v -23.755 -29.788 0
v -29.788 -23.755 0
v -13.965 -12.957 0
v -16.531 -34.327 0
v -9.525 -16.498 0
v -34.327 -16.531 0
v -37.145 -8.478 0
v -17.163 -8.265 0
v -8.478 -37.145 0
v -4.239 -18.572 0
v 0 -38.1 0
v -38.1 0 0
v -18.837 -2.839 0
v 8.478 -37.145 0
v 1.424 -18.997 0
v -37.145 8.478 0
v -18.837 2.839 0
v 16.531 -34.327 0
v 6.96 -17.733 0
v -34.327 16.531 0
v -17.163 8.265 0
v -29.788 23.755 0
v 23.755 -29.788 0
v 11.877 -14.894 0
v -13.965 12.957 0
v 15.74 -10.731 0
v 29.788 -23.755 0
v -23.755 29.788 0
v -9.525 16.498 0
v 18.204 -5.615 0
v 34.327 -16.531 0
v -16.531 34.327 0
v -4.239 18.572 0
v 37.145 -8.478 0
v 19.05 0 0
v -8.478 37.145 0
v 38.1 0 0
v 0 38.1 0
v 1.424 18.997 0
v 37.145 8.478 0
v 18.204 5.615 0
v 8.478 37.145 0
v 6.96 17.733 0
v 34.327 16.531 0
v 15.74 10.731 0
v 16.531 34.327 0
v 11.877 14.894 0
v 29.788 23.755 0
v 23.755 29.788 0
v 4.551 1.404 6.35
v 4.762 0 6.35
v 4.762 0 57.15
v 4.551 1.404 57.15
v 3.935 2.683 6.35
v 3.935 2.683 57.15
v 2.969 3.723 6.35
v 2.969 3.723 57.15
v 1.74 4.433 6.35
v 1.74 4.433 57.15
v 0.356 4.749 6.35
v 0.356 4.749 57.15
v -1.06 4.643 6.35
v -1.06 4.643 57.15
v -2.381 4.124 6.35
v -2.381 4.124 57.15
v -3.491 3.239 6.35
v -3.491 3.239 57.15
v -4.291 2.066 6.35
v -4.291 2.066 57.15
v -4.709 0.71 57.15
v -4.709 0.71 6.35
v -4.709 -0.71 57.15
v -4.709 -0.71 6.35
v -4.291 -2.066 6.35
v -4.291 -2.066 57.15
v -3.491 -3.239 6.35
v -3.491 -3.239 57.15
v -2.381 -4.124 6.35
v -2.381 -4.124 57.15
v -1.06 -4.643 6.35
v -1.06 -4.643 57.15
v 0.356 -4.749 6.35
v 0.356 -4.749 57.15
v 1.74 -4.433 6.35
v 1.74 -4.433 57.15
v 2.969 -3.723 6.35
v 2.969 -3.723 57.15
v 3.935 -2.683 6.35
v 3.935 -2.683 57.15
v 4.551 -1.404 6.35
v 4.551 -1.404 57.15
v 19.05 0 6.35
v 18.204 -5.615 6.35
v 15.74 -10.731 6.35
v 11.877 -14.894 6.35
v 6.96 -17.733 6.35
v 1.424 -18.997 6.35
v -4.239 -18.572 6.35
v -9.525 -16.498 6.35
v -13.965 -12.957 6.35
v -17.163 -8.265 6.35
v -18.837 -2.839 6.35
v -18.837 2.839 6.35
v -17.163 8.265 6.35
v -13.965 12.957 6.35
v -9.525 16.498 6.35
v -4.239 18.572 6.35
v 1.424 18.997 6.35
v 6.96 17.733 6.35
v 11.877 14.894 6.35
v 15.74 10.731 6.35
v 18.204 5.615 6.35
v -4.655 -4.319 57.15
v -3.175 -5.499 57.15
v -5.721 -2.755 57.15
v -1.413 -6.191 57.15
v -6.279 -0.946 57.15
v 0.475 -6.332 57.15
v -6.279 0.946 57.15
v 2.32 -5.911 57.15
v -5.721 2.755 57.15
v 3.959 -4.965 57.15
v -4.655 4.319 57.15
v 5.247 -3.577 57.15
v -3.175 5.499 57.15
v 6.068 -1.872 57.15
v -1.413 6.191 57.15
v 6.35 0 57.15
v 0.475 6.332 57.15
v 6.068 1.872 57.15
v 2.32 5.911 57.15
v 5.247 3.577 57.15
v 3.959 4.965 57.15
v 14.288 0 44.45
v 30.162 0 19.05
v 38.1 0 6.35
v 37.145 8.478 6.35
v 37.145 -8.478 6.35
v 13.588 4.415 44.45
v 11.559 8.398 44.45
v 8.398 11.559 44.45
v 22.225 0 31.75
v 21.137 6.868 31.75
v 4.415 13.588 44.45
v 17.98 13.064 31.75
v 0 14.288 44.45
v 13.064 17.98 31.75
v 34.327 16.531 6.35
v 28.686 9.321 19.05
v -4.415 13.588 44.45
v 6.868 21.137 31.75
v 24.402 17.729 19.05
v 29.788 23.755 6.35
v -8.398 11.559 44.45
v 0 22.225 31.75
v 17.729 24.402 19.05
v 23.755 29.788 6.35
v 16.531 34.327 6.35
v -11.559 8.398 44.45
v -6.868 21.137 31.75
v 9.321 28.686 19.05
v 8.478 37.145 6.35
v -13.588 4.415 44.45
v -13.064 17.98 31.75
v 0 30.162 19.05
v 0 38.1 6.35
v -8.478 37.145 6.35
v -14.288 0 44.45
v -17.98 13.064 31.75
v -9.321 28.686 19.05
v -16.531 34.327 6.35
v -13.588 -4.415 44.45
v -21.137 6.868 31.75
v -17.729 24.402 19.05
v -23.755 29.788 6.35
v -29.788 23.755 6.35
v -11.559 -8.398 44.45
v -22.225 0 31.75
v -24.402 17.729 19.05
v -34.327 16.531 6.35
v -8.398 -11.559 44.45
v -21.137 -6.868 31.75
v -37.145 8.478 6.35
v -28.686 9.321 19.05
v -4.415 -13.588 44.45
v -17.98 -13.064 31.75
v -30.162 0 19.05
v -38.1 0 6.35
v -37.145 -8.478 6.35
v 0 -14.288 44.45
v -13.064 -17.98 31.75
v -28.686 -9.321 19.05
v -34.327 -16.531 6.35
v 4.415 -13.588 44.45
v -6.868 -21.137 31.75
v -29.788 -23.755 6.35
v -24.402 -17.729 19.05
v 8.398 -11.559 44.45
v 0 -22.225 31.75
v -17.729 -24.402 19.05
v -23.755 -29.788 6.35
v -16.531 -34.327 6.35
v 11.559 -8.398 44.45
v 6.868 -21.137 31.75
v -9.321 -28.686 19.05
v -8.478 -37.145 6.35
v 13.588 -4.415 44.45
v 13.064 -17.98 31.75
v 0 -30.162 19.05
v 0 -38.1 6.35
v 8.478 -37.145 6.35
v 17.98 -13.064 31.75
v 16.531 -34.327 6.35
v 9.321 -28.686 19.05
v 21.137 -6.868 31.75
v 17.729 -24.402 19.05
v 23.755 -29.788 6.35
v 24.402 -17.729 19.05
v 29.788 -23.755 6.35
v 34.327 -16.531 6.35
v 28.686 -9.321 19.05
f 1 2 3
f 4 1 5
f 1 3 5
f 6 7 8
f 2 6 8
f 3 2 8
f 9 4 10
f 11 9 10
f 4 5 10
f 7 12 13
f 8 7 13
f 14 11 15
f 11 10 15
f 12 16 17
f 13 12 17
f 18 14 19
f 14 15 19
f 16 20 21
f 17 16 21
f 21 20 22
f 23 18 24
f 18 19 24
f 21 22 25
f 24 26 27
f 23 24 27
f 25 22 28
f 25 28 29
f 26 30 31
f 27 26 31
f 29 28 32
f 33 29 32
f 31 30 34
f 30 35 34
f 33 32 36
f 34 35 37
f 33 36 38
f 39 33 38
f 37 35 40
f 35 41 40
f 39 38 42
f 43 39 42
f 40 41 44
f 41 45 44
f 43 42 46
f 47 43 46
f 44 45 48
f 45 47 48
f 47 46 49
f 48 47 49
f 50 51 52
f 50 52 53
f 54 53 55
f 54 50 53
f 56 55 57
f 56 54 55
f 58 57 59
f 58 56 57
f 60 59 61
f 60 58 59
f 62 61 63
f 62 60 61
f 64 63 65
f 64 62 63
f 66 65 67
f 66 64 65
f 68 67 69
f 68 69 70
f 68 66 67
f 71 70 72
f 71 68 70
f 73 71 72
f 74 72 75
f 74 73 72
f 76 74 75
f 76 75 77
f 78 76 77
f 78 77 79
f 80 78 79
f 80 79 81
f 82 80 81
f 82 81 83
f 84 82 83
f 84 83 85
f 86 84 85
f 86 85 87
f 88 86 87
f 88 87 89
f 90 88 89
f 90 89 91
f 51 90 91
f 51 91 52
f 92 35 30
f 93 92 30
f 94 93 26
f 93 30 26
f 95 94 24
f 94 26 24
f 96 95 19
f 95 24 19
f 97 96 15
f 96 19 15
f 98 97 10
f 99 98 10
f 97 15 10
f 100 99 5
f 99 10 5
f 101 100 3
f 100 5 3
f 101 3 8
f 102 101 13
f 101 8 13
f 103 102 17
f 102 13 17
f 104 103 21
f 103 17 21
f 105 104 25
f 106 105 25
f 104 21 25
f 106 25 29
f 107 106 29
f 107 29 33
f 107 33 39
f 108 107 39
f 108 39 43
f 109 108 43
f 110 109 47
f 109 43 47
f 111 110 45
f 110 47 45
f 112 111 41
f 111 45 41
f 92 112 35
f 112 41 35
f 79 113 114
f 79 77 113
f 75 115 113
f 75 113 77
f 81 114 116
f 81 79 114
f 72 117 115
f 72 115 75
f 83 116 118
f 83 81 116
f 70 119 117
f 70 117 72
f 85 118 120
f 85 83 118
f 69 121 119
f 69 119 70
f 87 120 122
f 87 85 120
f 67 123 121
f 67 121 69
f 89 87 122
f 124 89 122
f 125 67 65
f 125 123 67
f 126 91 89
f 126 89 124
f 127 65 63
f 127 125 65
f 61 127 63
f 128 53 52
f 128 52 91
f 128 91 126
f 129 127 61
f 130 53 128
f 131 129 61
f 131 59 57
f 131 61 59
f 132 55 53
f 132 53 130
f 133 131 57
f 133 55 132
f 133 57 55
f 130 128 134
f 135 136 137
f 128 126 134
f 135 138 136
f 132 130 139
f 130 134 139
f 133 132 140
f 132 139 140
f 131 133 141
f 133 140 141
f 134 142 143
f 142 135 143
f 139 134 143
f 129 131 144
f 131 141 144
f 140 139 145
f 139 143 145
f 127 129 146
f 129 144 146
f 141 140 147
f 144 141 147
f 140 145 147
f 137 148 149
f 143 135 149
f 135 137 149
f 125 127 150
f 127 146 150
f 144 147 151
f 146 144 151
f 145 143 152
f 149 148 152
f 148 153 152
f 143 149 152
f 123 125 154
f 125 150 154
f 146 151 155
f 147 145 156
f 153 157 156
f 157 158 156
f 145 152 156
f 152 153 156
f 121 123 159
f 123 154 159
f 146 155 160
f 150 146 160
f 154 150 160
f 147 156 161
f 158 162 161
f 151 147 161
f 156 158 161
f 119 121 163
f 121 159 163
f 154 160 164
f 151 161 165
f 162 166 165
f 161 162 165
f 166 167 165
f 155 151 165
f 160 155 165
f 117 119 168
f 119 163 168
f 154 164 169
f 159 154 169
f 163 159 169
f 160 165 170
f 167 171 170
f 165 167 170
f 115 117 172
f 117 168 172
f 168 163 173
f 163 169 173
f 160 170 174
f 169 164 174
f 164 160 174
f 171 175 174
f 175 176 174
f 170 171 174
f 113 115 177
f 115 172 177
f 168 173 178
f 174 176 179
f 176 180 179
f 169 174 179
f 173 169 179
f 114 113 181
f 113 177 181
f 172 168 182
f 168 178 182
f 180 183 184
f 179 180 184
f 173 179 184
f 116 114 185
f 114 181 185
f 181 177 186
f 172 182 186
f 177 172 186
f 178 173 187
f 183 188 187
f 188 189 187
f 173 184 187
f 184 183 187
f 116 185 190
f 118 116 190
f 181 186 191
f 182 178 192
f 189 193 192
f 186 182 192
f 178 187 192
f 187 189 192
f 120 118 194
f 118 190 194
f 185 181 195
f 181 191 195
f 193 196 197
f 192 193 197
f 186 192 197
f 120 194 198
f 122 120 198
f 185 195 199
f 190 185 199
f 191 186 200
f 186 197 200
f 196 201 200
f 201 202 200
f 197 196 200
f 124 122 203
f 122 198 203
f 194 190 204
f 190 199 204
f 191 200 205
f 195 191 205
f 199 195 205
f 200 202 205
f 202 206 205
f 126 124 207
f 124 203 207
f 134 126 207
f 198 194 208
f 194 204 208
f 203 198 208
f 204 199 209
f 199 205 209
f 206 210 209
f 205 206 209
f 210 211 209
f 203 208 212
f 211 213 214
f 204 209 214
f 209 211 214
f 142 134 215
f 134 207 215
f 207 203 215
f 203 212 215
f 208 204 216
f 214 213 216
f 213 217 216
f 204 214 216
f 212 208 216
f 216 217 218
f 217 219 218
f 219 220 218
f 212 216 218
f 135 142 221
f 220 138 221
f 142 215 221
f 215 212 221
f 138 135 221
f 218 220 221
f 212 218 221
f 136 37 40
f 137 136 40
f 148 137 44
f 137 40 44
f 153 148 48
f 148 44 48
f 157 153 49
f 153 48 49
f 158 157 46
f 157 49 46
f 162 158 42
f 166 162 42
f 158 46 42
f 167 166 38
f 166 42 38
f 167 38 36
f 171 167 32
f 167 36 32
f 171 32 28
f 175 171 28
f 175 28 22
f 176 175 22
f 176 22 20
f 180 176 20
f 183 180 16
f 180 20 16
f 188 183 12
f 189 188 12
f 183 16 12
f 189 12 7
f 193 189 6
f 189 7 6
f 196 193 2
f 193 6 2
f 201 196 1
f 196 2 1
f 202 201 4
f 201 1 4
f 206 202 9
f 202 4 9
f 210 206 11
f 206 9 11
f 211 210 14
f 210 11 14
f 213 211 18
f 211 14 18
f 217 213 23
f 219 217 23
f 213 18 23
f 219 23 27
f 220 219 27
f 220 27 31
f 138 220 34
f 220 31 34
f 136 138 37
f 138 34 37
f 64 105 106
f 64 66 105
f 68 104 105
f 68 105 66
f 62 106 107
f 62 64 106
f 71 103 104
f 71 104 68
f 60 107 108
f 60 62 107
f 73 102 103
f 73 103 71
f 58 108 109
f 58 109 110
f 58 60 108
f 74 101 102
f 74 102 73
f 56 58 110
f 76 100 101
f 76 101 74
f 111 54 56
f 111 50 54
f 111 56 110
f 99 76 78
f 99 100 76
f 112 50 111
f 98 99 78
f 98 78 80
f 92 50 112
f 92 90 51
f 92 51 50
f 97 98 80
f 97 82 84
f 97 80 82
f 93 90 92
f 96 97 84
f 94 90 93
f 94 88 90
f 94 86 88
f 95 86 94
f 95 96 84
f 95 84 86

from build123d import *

# Parameters (mm, degrees)
F0_R     = 38.1
F0_R_2   = 4.7625
F1_DEPTH = 57.15
F2_SIZE2 = 50.8
F2_SIZE  = 31.75
F4_R     = 19.05
F5_DEPTH = 6.35


with BuildPart() as f1:
    # F0 (on Top) → F1 (new body)
    with BuildSketch(Plane.XY):
        Circle(F0_R)
        Circle(F0_R_2, mode=Mode.SUBTRACT)
    extrude(amount=F1_DEPTH)

    # F2
    f2_edges = [f1.edges().sort_by_distance(p)[0] for p in [
        (-38.1, 0, 57.15),
    ]]
    f2_side = f1.faces().sort_by_distance((-37.022369, 0, 57.15))[0]
    chamfer(f2_edges, length=F2_SIZE, length2=F2_SIZE2, reference=f2_side)

    # F4 (on face) → F5 (cut)
    with BuildSketch(Plane(origin=(0, 0, 0), x_dir=(1, 0, 0), z_dir=(0, 0, -1))):
        Circle(F4_R)
    extrude(amount=-F5_DEPTH, mode=Mode.SUBTRACT)


solid = f1.part
